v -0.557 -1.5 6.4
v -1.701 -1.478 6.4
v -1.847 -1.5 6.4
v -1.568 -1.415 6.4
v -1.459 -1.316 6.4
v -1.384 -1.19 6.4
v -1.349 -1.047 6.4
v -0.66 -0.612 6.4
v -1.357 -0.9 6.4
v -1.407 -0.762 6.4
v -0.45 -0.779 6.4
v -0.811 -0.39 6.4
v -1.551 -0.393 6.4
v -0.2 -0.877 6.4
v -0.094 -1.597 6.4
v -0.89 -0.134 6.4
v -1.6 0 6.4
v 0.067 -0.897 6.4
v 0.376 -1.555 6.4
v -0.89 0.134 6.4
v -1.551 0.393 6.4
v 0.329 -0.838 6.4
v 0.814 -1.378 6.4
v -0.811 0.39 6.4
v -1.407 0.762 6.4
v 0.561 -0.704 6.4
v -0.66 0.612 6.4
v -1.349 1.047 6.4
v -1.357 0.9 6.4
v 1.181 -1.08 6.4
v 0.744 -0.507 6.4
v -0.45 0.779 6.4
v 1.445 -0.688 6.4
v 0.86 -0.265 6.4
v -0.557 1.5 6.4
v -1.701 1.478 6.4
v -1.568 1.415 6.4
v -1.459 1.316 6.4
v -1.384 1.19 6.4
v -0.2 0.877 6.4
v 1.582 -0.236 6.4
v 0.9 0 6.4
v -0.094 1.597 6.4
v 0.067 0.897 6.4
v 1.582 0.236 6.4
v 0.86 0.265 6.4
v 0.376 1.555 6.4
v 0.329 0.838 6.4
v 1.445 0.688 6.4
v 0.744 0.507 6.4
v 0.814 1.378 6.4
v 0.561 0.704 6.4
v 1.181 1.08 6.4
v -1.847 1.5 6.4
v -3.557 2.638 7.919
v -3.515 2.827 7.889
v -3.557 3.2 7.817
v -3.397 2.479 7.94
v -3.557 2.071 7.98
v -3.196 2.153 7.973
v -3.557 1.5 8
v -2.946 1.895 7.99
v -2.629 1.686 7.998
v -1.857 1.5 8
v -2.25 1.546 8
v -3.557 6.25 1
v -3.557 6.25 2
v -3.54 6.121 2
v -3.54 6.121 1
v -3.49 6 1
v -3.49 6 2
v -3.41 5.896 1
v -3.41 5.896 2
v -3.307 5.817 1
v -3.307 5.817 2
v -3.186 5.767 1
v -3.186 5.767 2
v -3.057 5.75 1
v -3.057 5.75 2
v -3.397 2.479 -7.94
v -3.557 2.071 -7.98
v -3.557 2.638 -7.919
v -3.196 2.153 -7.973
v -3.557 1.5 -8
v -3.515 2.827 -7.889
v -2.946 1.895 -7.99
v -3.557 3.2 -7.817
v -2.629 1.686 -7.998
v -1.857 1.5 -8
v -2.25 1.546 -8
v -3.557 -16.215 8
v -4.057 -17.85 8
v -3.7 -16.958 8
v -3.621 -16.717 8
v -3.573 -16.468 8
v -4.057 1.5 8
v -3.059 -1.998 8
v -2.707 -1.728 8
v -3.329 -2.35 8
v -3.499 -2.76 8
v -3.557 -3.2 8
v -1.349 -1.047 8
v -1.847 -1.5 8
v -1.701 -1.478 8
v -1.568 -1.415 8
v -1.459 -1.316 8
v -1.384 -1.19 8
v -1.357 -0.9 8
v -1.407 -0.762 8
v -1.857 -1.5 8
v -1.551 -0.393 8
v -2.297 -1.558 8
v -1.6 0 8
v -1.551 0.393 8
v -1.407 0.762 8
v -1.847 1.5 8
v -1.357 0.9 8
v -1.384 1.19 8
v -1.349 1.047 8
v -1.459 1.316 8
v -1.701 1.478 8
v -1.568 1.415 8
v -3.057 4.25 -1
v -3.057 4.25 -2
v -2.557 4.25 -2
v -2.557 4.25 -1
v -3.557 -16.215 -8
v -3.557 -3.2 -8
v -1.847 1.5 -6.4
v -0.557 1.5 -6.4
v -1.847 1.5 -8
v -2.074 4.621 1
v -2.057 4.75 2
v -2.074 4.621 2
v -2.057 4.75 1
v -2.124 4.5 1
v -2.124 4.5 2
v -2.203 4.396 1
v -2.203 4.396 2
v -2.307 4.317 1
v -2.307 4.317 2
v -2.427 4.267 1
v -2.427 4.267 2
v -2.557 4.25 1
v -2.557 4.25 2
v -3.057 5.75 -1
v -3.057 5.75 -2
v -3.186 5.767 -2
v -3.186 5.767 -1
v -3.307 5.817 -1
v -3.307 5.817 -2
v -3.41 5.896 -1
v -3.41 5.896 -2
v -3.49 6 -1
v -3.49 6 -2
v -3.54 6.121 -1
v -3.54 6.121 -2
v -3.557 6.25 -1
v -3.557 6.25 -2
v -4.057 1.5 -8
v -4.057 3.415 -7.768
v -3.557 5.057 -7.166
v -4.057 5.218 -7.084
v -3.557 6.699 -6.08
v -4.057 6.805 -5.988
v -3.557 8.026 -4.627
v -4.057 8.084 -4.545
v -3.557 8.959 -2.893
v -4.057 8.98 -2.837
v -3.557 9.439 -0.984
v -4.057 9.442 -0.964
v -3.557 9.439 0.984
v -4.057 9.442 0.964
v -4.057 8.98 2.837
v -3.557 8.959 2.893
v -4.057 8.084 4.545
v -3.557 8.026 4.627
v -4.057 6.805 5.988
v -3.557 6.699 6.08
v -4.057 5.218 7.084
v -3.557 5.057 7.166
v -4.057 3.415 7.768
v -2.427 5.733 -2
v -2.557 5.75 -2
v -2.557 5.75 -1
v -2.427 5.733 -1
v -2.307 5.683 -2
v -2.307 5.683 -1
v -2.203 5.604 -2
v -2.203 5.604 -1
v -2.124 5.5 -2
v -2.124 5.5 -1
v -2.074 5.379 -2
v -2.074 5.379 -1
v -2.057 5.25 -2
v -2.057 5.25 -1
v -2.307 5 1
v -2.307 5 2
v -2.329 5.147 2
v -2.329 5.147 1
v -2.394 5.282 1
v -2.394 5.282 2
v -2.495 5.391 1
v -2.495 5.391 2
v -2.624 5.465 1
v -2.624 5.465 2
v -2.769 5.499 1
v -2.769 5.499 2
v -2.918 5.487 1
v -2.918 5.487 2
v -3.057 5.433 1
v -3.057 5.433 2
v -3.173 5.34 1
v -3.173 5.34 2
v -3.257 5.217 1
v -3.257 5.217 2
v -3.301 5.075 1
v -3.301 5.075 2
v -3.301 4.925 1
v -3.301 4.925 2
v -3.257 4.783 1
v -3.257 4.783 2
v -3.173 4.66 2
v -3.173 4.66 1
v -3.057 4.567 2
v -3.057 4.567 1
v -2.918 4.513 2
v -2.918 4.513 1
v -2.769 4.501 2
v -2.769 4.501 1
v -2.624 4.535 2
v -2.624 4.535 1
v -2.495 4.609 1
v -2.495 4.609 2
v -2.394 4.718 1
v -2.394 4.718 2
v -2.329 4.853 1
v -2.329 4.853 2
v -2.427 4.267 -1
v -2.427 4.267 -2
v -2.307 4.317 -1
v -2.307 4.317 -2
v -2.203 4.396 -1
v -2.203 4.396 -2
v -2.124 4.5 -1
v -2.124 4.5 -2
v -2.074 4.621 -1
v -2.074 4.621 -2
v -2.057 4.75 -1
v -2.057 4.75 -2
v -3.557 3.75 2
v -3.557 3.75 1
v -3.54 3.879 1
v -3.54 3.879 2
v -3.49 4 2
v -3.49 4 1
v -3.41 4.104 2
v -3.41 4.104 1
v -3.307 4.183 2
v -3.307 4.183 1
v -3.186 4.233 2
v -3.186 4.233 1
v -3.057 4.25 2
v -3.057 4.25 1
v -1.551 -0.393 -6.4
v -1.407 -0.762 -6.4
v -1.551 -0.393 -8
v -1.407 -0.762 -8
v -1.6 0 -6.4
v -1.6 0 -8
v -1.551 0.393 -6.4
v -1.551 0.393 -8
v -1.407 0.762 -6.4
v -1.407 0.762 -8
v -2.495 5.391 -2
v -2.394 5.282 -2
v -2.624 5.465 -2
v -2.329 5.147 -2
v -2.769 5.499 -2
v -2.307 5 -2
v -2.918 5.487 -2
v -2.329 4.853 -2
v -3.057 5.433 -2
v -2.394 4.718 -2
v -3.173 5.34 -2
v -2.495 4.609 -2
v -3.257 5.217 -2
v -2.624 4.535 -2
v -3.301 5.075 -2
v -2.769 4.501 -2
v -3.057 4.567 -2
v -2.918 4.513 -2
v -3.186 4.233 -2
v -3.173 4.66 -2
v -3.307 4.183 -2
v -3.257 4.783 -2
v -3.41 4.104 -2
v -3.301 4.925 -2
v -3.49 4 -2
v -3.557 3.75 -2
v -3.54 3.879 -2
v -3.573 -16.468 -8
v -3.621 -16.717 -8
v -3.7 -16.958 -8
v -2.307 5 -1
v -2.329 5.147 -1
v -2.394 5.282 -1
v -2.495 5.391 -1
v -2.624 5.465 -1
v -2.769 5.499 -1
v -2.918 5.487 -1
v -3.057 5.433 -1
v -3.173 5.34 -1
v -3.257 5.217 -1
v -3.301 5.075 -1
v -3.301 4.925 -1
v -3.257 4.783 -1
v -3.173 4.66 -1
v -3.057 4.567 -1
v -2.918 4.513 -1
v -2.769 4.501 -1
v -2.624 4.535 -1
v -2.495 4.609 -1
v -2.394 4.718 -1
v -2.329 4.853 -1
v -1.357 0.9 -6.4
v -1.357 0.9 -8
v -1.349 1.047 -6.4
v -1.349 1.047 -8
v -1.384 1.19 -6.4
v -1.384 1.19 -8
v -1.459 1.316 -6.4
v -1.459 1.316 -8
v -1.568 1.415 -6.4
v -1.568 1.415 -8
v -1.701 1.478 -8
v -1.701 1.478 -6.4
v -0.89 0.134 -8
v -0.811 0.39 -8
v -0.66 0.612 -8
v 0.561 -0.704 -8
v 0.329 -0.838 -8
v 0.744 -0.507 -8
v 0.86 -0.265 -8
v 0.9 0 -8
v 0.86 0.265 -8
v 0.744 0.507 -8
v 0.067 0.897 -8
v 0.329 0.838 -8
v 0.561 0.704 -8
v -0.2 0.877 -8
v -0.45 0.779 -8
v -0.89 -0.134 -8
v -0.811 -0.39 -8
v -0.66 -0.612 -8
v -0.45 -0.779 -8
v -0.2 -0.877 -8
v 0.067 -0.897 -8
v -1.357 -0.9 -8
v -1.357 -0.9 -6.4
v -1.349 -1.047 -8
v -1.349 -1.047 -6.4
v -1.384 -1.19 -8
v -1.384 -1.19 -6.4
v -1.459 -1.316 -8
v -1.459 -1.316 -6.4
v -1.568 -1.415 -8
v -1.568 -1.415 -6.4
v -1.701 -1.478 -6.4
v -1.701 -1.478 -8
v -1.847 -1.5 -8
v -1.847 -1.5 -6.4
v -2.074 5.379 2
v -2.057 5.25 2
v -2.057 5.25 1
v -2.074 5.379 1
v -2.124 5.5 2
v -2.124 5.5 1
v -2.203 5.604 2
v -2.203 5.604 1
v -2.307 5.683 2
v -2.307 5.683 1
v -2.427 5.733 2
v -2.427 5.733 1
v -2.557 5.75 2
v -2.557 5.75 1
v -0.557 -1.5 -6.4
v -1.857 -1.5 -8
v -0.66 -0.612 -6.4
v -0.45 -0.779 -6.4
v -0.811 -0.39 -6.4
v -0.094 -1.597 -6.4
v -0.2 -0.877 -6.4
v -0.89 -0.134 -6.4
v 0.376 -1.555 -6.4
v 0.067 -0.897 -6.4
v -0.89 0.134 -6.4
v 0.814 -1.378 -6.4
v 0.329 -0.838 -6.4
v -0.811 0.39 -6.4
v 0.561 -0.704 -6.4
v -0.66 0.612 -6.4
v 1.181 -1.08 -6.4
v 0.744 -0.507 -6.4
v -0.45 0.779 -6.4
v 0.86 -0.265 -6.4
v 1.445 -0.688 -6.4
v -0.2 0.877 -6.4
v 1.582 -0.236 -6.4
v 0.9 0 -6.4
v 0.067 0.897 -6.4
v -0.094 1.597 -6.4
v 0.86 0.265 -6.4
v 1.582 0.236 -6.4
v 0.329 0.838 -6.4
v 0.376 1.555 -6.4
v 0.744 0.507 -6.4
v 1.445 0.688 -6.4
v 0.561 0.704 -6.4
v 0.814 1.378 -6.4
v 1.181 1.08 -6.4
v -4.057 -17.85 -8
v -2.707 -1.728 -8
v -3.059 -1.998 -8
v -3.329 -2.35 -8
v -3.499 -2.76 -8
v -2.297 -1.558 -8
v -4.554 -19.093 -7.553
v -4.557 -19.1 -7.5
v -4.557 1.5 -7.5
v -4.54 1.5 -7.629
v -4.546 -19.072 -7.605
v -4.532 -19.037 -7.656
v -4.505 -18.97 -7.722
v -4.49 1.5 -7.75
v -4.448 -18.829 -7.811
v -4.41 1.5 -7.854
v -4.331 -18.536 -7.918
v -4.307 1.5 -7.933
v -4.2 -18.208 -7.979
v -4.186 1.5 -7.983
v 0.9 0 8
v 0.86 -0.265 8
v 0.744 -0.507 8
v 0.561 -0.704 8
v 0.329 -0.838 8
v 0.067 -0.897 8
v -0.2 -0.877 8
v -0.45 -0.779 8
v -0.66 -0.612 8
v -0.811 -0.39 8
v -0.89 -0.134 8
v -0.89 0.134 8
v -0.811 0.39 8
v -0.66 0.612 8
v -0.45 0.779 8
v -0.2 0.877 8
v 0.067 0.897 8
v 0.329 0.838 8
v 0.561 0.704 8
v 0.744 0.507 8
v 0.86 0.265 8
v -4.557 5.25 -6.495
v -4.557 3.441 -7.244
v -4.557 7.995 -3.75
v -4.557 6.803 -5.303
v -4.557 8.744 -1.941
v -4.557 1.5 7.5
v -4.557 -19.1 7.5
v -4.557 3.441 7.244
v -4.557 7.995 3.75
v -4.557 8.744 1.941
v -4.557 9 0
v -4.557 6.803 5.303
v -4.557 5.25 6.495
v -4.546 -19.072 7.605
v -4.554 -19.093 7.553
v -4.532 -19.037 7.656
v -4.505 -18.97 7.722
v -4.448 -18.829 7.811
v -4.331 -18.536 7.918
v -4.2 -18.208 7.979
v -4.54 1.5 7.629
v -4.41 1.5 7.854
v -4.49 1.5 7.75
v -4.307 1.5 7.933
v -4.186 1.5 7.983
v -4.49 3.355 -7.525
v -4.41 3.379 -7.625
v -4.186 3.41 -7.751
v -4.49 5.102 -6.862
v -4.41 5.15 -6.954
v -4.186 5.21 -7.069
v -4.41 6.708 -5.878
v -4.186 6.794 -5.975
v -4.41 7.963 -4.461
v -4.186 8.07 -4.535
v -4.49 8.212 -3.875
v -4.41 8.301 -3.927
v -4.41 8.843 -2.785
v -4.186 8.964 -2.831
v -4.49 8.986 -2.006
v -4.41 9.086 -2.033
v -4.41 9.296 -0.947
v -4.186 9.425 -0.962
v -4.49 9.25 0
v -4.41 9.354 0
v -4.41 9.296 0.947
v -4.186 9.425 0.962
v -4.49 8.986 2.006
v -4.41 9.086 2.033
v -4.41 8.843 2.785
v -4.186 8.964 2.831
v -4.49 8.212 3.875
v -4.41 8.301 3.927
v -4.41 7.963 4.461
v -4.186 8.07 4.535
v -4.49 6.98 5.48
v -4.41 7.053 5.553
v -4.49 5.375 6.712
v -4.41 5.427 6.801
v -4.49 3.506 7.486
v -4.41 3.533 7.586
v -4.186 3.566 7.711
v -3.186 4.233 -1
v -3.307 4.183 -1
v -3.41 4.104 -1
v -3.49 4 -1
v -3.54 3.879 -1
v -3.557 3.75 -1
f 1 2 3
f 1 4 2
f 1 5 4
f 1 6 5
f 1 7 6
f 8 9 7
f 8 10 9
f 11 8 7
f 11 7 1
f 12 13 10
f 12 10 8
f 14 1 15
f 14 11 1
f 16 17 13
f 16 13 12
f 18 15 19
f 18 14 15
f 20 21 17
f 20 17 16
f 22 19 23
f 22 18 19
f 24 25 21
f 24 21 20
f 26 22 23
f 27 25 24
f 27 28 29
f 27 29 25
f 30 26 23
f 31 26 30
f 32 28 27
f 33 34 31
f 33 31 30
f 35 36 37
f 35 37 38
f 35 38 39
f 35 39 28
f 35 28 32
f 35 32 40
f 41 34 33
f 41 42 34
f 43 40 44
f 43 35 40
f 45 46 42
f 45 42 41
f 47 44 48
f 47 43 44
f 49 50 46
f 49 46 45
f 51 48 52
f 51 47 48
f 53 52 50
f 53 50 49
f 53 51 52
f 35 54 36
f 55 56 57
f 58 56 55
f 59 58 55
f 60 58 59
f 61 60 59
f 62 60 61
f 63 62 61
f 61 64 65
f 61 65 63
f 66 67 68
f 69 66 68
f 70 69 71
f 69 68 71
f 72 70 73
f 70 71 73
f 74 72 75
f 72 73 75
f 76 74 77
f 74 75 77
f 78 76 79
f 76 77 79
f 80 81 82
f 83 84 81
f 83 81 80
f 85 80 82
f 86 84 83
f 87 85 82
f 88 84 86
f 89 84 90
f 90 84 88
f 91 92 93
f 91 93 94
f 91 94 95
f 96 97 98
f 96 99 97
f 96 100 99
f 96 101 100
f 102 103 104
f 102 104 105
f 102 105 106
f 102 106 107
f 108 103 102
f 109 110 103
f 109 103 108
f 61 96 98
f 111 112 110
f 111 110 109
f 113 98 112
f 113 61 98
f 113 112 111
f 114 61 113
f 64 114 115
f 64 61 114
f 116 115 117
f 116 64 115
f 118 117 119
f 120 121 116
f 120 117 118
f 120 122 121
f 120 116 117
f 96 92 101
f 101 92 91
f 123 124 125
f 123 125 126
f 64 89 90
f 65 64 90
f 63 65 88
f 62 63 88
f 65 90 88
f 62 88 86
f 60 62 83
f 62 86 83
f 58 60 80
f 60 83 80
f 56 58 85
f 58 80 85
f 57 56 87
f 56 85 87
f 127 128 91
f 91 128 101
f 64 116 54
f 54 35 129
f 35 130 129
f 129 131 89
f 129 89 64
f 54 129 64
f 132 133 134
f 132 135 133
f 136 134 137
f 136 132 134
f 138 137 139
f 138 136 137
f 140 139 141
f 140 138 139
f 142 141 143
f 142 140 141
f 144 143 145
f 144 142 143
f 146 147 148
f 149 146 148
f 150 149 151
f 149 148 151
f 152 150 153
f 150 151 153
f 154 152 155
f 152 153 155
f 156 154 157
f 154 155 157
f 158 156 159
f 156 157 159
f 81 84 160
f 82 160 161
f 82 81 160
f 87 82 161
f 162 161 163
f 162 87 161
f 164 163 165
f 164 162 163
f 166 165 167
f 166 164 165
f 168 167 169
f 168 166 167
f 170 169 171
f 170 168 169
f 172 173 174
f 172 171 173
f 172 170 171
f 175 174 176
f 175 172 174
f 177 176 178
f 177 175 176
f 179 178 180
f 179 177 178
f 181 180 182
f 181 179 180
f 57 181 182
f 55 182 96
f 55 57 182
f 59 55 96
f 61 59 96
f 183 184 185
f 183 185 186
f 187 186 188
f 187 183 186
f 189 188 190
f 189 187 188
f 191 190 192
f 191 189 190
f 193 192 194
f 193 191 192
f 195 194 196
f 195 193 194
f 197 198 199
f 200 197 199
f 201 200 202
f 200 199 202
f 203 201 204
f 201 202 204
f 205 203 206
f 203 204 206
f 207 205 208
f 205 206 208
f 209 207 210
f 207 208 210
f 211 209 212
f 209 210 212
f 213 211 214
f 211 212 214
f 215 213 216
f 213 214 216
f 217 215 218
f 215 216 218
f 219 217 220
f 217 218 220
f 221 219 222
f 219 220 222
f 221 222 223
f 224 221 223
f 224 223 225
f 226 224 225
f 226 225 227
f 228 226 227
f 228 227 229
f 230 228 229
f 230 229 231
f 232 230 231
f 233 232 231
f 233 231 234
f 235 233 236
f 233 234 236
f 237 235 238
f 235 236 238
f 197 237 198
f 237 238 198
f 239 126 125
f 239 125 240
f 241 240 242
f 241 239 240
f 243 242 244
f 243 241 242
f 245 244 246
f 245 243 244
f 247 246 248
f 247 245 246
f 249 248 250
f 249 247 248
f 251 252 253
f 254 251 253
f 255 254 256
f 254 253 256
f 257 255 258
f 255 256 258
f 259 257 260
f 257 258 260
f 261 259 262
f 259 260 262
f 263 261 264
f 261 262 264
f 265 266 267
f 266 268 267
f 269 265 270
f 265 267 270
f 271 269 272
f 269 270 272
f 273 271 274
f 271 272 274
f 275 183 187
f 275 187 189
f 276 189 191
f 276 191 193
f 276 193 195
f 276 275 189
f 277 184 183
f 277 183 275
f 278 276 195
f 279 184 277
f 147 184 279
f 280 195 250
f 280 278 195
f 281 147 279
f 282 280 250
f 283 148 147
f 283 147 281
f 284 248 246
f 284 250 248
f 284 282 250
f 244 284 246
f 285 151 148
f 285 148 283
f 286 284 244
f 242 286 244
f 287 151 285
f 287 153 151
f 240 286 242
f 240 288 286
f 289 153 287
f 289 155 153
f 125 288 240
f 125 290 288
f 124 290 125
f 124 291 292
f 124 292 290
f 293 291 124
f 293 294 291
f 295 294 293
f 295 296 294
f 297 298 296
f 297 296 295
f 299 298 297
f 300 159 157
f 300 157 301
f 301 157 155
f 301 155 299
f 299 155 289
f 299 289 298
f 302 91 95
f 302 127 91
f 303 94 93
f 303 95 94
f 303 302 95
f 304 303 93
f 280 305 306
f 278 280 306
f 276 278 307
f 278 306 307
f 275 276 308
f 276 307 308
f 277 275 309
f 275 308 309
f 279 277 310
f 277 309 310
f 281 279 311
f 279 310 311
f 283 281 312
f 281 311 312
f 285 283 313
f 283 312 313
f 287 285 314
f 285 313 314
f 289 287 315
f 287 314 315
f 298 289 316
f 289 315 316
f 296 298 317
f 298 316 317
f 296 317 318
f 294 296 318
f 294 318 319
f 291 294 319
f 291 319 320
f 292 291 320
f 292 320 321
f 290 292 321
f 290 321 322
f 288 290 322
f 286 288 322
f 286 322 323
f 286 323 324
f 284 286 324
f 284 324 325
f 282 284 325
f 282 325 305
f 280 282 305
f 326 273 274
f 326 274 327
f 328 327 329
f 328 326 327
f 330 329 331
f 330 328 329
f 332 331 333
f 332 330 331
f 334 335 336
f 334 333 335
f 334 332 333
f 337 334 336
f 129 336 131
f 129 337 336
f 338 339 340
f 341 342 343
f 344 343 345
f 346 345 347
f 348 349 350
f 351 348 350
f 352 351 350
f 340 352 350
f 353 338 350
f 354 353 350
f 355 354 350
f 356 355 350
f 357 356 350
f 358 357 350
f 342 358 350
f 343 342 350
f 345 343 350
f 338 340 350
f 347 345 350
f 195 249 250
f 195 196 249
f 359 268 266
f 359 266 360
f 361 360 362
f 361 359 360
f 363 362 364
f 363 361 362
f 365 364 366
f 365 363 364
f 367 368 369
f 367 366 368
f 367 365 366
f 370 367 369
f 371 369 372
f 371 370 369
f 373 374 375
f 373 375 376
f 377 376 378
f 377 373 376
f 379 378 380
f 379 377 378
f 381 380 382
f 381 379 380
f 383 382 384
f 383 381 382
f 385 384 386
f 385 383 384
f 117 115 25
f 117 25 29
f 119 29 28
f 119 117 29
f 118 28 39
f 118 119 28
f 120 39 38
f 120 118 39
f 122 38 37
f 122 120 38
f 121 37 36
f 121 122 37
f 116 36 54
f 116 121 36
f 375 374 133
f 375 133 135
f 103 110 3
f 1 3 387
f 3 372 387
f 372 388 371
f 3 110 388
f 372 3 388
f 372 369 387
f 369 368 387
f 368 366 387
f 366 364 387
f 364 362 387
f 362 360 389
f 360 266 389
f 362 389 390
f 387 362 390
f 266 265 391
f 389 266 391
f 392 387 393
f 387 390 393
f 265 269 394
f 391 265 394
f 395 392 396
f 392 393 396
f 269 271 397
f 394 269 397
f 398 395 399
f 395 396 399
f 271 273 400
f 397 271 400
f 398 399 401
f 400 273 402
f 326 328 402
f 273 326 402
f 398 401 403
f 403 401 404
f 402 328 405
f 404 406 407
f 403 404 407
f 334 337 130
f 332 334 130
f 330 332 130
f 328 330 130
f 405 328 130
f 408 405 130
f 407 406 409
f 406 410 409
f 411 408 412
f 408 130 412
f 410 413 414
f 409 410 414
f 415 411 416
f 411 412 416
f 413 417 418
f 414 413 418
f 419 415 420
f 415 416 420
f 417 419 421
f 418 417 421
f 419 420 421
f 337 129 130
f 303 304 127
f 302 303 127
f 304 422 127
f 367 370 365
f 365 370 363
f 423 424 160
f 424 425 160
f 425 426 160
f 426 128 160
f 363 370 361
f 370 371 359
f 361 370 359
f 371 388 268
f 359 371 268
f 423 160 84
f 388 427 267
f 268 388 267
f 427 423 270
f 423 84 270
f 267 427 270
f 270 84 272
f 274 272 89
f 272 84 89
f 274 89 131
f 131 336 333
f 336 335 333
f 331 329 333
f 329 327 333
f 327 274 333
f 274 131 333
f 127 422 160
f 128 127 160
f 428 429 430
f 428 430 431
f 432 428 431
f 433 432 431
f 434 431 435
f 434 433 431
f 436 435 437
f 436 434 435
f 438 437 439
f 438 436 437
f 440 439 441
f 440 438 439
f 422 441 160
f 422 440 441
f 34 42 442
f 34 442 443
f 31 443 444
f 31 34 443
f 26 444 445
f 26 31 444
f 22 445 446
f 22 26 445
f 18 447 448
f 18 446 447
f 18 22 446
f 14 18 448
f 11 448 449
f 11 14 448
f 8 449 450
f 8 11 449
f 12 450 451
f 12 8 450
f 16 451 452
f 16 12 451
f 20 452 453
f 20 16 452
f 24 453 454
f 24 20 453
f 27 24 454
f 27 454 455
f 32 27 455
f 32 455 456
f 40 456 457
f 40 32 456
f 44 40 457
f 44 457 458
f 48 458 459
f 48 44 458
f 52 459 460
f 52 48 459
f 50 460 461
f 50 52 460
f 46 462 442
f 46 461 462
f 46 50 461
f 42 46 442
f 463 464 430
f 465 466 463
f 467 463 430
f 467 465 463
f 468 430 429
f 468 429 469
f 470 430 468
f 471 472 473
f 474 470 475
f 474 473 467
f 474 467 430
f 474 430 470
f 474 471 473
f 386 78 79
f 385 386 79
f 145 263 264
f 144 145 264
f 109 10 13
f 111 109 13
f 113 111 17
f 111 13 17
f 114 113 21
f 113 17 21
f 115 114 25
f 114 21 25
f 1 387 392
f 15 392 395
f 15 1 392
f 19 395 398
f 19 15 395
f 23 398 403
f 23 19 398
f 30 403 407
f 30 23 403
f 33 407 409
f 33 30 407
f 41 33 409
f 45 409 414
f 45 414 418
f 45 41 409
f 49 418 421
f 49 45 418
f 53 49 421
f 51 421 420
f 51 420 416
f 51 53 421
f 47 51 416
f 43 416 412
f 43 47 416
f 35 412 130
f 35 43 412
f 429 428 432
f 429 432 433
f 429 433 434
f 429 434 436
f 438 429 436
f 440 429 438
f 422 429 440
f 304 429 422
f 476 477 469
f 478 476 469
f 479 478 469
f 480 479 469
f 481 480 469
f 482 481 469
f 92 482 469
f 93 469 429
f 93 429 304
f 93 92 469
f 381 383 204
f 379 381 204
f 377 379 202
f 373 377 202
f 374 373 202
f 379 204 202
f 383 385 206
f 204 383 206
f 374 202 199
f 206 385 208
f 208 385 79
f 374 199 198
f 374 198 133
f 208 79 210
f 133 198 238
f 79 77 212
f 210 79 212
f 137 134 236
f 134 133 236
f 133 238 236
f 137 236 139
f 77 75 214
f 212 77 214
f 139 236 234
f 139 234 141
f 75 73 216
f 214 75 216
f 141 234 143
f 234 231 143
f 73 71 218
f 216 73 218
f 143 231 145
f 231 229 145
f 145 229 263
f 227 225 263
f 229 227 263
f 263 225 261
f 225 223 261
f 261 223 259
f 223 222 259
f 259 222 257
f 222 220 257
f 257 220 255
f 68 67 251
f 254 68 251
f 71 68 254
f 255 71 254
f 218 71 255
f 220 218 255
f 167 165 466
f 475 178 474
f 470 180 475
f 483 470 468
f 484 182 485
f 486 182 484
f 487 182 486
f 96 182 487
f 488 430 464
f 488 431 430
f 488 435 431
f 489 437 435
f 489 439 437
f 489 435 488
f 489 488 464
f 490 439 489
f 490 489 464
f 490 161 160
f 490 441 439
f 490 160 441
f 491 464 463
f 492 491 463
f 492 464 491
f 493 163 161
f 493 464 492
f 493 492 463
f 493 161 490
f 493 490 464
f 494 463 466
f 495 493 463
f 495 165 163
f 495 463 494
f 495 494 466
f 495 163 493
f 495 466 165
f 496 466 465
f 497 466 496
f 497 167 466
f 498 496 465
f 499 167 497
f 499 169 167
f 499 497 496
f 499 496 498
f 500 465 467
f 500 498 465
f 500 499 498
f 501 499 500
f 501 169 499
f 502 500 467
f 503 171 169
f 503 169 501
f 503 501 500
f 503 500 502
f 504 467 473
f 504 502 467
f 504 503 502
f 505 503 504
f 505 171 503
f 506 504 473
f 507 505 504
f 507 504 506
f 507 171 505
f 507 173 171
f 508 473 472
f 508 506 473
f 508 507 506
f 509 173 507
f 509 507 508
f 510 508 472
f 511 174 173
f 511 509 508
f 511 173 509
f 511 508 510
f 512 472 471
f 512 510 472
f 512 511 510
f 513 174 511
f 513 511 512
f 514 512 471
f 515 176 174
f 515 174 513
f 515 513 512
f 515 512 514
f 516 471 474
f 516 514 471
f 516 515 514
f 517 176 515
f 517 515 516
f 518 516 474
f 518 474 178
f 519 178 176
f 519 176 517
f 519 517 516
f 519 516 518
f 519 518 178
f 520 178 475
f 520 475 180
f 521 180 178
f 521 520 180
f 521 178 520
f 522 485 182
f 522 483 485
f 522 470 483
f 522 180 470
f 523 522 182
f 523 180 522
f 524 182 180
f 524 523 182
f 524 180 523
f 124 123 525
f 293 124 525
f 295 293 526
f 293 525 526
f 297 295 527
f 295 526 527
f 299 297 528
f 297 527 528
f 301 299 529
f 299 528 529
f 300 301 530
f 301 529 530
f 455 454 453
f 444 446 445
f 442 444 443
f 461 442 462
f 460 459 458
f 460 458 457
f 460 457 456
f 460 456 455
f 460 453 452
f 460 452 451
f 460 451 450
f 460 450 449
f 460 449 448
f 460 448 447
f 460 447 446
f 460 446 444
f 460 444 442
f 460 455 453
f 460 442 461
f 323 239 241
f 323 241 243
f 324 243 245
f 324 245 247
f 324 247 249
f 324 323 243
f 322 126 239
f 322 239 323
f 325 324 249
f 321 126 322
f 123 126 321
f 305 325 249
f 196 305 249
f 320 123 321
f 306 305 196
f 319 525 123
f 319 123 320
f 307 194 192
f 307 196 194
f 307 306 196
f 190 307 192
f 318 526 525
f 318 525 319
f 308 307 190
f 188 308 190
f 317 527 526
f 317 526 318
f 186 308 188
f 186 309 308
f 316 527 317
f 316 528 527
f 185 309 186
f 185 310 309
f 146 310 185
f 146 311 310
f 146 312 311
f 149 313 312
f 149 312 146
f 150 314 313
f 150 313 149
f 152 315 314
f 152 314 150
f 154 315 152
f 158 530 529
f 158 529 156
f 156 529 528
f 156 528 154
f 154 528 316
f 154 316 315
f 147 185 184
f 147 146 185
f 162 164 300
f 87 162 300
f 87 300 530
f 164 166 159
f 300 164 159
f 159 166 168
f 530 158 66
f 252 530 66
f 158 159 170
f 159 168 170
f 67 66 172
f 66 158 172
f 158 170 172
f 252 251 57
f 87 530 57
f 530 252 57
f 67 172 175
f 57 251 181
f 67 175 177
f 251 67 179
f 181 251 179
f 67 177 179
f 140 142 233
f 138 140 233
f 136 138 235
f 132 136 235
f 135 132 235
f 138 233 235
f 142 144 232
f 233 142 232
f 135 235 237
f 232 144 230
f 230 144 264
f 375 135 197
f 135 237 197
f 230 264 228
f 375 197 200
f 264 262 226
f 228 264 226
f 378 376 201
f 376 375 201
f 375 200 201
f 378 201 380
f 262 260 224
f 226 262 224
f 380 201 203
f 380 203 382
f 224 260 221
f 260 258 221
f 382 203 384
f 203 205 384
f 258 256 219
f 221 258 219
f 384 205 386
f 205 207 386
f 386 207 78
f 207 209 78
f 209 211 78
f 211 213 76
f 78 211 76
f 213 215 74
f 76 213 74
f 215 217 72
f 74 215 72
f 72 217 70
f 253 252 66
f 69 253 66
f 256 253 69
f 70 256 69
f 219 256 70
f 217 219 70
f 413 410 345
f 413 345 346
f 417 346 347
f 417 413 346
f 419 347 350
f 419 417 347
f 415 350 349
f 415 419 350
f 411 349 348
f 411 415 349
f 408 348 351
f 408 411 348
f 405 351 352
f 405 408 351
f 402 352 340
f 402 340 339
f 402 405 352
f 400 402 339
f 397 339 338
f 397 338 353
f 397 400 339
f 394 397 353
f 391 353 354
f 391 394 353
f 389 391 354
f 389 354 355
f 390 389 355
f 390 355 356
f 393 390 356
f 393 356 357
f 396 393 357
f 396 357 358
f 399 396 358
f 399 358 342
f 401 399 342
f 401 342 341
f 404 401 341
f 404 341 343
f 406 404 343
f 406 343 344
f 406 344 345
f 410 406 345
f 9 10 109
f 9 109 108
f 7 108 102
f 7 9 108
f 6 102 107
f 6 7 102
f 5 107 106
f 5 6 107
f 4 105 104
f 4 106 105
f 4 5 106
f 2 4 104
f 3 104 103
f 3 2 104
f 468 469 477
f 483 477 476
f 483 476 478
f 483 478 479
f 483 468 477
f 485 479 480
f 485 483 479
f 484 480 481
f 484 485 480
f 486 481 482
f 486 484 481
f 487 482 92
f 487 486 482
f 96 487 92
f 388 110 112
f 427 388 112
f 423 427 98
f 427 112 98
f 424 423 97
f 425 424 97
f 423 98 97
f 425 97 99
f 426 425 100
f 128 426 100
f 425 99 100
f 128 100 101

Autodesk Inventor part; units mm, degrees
ref_plane "YZ Plane" through (0, 0, 0) normal (1, 0, 0) x (0, 1, 0)
ref_plane "XZ Plane" through (0, 0, 0) normal (0, 1, 0) x (-1, 0, 0)
ref_plane "XY Plane" through (0, 0, 0) normal (0, 0, 1) x (1, 0, 0)
sketch "스케치1" plane through (0, 0, 0) normal (0, 0, 1) x (1, 0, 0)
  circle A0 centre (0, 0) radius 0.9
  circle A1 centre (0, 0) radius 1.6
  line L0 (-0.5568, 1.5) -> (-3.5568, 1.5)
  line L1 (-3.5568, 1.5) -> (-3.5568, -1.5)
  line L2 (-3.5568, -1.5) -> (-0.5568, -1.5)
  circle A2 centre (0, 0) radius 1.25
  point P0 (-0.2784, -0.75)
  point P1 (-0.2784, 0.75)
  point P2 (-3.5568, 0)
  dimension "d0" = 1.8
  dimension "d3" = 3.2
  dimension "d6" = 3
  dimension "d7" = 3
  dimension "d10" = 2.5
extrude "돌출1" add sketch "스케치1" along normal mid plane 16 contours A0
extrude "돌출2" add sketch "스케치1" along normal mid plane 12.8 contours A1 | A2
extrude "돌출3" add sketch "스케치1" along normal mid plane 16 contours A1 L2 L1 L0
extrude "돌출4" [suppressed]
sketch "스케치2" plane through (-3.5568, -0.75, 4) normal (-1, 0, 0) x (0, 0, 1)
  line L0 (4, 2.25) -> (4, 0.75)
  line L1 (-12, 2.25) -> (4, 2.25) projected
  line L2 (-12, 0.75) -> (-12, 2.25)
  arc A0 (4, 2.25) -> (-12, 2.25) centre (-4, 2.25) ccw
  line L3 (-12, 2.25) -> (-12, -19.75)
  line L4 (-12, -19.75) -> (4, -19.75)
  line L5 (4, -19.75) -> (4, 2.25)
  point P0 (-4, 0.75)
  dimension "d15" = 22
  dimension "d52" = 8
  dimension "d53" = 16
  dimension "d54" = 8
extrude "돌출5" add sketch "스케치2" along normal blind 1
sketch "스케치4" plane through (-3.5568, -0.75, 4) normal (1, 0, 0) x (0, 0, -1)
  line L0 (3.25, 5) -> (4.75, 5)
  line L1 (4.75, 5) -> (4.75, 6.5)
  line L2 (4.75, 6.5) -> (3.25, 6.5)
  line L3 (3.25, 6.5) -> (3.25, 5)
  line L4 (3.25, 5) -> (4.75, 6.5) construction
  line L5 (4.75, 5) -> (3.25, 6.5) construction
  line L6 (2, 5) -> (3, 5)
  line L7 (3, 5) -> (3, 6.5)
  line L8 (3, 6.5) -> (2, 6.5)
  line L9 (2, 6.5) -> (2, 5)
  line L10 (2, 5) -> (3, 6.5) construction
  line L11 (3, 5) -> (2, 6.5) construction
  line L12 (6, 5) -> (5, 5)
  line L13 (5, 5) -> (5, 6.5)
  line L14 (5, 6.5) -> (6, 6.5)
  line L15 (6, 6.5) -> (6, 5)
  line L16 (6, 5) -> (5, 6.5) construction
  line L17 (5, 5) -> (6, 6.5) construction
  point P0 (4, 0.75)
  point P1 (4, 5.75)
  point P2 (2.5, 5.75)
  point P3 (5.5, 5.75)
  dimension "d26" = 1.5
  dimension "d27" = 1.5
  dimension "d28" = 1
  dimension "d29" = 1
  dimension "d30" = 1.5
  dimension "d31" = 3
  dimension "d32" = 5
extrude "돌출7" add sketch "스케치4" along normal blind 1.5 contours L9 L8 L7 L6 | L12 L13 L14 L15
sketch "스케치5" plane through (0, 0, 0) normal (0, 0, 1) x (1, 0, 0)
  circle A0 centre (-2.8068, 5) radius 0.5
  circle A1 centre (-2.8068, 5) radius 0.4
  line L0 (-2.8068, 4.5) -> (0.1861, 4.4792)
  line L1 (0.1861, 4.4792) -> (0.1932, 5.5)
  line L2 (0.1932, 5.5) -> (-2.8068, 5.5)
  line L3 (-3.5568, 4.25) -> (-2.0568, 4.25) projected
  point P0 (0, 0)
  point P1 (-2.8068, 4.25)
  dimension "d35" = 5
  dimension "d36" = 1
  dimension "d37" = 0.8
  dimension "d49" = 3
extrude "돌출8" cut sketch "스케치5" along normal through all both and the other way through all contours A0 | A1
extrude "돌출9" [suppressed]
extrude "돌출10" [suppressed]
sketch "스케치6" plane through (0, 0, 8) normal (0, 0, 1) x (1, 0, 0)
  line L0 (-4.5568, -20.5) -> (-4.5568, 1.5) projected
  line L1 (-3.5568, -20.5) -> (-4.5568, -20.5) projected
  line L2 (-3.5568, -20.5) -> (-3.5568, -1.5) projected
  line L3 (-4.5568, -19.1) -> (-3.5568, -16.6)
  dimension "d55" = 1.4
  dimension "d61" = 3.9
extrude "돌출11" cut sketch "스케치6" against normal through all
fillet "모깎기9" radius 0.5 11 edges at (-4.5568, 9.5, 0) (-4.5568, -8.8, -8) (-4.5568, -8.8, 8) (-3.5568, 5.75, 1.5) (-2.0568, 5.75, 1.5) (-2.0568, 4.25, 1.5) (-3.5568, 4.25, 1.5) (-3.5568, 4.25, -1.5) (-3.5568, 5.75, -1.5) (-2.0568, 5.75, -1.5) (-2.0568, 4.25, -1.5)
fillet "모깎기10" radius 2 1 edges at (-3.5568, -16.6, 0)
fillet "모깎기11" radius 0.5 4 edges at (-0.5568, 1.5, 7.2) (-0.5568, -1.5, 7.2) (-0.5568, 1.5, -7.2) (-0.5568, -1.5, -7.2)
fillet "모깎기12" radius 1.7 2 edges at (-3.5568, -1.5, 0) (-3.5568, 1.5, 0)
equation "\"d29\" = d28"
properties part number "집게 이동"
